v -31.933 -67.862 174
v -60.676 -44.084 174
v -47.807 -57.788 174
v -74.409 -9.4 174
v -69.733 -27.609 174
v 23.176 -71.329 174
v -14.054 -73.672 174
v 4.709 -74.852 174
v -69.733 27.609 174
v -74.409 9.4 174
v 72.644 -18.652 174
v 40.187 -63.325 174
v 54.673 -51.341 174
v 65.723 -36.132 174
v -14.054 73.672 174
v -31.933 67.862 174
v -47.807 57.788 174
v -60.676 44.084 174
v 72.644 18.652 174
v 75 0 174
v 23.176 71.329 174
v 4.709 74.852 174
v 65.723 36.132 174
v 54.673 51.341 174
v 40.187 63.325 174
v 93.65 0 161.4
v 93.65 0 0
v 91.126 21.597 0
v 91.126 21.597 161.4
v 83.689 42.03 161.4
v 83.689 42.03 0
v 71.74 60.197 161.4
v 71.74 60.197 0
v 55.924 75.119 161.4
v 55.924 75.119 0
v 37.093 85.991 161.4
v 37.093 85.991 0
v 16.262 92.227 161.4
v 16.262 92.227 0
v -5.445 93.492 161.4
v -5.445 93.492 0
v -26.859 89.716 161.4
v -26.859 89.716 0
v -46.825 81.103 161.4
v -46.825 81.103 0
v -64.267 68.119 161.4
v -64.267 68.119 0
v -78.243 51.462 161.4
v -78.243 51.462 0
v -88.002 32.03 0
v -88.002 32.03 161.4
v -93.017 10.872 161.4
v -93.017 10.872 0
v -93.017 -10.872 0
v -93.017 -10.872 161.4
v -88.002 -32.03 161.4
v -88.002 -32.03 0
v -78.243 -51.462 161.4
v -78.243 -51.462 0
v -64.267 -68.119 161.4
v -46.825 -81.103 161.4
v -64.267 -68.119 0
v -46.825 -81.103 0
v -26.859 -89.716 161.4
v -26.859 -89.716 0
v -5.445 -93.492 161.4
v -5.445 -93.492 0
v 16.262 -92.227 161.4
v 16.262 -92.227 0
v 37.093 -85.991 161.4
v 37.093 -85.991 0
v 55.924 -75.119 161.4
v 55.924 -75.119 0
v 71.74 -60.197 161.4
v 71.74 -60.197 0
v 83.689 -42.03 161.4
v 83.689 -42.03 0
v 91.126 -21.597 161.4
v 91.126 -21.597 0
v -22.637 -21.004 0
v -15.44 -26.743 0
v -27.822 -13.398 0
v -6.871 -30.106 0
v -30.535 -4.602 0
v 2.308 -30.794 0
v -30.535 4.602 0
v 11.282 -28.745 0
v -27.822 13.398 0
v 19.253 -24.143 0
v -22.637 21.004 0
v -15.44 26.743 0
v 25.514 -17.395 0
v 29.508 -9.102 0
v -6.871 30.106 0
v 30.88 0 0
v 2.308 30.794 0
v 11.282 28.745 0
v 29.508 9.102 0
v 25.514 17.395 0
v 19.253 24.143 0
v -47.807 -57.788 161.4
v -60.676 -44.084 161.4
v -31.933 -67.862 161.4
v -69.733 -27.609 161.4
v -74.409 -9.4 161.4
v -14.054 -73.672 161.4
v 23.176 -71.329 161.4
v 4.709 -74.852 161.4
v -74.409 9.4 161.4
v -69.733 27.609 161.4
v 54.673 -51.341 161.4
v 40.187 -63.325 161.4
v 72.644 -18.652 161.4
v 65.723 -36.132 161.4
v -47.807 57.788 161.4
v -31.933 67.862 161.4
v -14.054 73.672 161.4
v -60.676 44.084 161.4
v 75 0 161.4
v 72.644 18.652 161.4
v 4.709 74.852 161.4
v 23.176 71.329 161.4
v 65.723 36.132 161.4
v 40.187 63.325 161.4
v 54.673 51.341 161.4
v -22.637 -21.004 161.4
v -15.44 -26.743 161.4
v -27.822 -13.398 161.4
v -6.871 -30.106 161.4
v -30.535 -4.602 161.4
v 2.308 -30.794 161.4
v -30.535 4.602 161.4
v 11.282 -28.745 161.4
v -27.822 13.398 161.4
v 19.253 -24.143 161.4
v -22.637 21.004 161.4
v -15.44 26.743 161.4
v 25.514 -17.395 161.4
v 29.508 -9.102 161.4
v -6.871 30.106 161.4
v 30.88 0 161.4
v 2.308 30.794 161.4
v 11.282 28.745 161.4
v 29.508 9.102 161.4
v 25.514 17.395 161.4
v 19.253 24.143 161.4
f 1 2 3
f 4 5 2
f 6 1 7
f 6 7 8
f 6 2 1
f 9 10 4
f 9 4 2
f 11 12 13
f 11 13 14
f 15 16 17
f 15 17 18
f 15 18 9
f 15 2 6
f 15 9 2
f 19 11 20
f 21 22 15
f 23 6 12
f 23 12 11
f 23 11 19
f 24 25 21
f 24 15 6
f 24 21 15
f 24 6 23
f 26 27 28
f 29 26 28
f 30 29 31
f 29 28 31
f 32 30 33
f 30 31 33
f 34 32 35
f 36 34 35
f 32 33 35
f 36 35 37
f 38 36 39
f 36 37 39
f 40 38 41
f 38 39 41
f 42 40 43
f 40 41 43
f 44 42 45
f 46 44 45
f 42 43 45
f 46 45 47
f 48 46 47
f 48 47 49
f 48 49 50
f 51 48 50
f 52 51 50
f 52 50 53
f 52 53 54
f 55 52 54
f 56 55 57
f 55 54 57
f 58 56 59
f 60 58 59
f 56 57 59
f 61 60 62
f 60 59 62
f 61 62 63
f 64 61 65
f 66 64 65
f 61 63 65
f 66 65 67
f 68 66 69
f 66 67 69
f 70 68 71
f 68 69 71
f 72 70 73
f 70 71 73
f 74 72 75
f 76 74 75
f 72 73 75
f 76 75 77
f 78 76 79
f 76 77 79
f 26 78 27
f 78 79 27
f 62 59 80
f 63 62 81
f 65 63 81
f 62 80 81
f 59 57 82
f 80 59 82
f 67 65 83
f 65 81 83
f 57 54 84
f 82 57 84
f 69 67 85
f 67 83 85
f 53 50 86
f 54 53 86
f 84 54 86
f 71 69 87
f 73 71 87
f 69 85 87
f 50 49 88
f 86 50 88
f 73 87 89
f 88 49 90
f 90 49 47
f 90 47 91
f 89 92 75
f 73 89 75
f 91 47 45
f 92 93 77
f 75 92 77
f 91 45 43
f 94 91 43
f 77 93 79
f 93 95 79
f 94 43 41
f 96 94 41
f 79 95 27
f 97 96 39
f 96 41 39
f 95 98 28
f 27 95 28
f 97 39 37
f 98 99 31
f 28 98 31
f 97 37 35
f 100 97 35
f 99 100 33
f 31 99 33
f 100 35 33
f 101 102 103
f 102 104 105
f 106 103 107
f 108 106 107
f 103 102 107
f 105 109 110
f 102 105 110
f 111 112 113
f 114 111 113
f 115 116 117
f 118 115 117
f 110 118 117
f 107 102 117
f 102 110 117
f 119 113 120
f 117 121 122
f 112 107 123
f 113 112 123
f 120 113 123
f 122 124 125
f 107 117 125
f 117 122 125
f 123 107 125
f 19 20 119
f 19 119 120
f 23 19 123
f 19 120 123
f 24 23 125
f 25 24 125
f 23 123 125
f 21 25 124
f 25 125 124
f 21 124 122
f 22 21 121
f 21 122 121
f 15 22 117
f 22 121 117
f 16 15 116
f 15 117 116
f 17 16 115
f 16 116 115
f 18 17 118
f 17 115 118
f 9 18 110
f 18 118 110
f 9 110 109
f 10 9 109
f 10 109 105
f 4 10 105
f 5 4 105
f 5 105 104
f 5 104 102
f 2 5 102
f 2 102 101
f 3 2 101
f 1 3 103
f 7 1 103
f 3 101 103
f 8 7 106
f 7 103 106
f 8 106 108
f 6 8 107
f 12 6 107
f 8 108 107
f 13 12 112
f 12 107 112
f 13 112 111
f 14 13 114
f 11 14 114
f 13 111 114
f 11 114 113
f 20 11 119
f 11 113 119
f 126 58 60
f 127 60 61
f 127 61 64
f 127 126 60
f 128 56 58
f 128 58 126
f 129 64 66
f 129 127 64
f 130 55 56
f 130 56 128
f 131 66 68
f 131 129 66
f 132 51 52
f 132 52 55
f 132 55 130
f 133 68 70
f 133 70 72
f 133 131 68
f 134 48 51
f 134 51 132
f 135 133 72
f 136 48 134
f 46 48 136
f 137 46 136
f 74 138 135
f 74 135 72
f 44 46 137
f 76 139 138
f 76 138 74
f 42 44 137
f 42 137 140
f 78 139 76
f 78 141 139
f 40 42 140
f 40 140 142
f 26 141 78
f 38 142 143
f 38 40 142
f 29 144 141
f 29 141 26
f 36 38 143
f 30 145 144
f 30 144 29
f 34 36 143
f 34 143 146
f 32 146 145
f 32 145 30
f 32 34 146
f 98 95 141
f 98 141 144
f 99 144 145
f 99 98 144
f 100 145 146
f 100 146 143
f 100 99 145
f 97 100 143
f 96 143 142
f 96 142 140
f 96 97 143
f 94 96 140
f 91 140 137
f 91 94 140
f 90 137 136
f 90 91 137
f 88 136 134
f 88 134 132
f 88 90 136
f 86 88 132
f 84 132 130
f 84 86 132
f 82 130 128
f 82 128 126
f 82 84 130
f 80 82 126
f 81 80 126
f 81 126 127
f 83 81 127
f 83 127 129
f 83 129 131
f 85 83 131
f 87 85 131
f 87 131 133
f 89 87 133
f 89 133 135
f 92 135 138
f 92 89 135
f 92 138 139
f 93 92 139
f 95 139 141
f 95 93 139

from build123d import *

# Parameters (mm, degrees)
CYLINDER001_R     = 75
CYLINDER001_DEPTH = 12.6
TUBE_R            = 93.65
TUBE_R_2          = 30.88
TUBE_DEPTH        = 161.4


with BuildPart() as connector:
    # Cylinder001 → Cylinder001 (new body)
    with BuildSketch(Plane.XY.offset(161.4)):
        Circle(CYLINDER001_R)
    extrude(amount=CYLINDER001_DEPTH)


with BuildPart() as sensor:
    # Tube → Tube (new body)
    with BuildSketch(Plane.XY):
        Circle(TUBE_R)
        Circle(TUBE_R_2, mode=Mode.SUBTRACT)
    extrude(amount=TUBE_DEPTH)


solid = Compound([connector.part, sensor.part])
